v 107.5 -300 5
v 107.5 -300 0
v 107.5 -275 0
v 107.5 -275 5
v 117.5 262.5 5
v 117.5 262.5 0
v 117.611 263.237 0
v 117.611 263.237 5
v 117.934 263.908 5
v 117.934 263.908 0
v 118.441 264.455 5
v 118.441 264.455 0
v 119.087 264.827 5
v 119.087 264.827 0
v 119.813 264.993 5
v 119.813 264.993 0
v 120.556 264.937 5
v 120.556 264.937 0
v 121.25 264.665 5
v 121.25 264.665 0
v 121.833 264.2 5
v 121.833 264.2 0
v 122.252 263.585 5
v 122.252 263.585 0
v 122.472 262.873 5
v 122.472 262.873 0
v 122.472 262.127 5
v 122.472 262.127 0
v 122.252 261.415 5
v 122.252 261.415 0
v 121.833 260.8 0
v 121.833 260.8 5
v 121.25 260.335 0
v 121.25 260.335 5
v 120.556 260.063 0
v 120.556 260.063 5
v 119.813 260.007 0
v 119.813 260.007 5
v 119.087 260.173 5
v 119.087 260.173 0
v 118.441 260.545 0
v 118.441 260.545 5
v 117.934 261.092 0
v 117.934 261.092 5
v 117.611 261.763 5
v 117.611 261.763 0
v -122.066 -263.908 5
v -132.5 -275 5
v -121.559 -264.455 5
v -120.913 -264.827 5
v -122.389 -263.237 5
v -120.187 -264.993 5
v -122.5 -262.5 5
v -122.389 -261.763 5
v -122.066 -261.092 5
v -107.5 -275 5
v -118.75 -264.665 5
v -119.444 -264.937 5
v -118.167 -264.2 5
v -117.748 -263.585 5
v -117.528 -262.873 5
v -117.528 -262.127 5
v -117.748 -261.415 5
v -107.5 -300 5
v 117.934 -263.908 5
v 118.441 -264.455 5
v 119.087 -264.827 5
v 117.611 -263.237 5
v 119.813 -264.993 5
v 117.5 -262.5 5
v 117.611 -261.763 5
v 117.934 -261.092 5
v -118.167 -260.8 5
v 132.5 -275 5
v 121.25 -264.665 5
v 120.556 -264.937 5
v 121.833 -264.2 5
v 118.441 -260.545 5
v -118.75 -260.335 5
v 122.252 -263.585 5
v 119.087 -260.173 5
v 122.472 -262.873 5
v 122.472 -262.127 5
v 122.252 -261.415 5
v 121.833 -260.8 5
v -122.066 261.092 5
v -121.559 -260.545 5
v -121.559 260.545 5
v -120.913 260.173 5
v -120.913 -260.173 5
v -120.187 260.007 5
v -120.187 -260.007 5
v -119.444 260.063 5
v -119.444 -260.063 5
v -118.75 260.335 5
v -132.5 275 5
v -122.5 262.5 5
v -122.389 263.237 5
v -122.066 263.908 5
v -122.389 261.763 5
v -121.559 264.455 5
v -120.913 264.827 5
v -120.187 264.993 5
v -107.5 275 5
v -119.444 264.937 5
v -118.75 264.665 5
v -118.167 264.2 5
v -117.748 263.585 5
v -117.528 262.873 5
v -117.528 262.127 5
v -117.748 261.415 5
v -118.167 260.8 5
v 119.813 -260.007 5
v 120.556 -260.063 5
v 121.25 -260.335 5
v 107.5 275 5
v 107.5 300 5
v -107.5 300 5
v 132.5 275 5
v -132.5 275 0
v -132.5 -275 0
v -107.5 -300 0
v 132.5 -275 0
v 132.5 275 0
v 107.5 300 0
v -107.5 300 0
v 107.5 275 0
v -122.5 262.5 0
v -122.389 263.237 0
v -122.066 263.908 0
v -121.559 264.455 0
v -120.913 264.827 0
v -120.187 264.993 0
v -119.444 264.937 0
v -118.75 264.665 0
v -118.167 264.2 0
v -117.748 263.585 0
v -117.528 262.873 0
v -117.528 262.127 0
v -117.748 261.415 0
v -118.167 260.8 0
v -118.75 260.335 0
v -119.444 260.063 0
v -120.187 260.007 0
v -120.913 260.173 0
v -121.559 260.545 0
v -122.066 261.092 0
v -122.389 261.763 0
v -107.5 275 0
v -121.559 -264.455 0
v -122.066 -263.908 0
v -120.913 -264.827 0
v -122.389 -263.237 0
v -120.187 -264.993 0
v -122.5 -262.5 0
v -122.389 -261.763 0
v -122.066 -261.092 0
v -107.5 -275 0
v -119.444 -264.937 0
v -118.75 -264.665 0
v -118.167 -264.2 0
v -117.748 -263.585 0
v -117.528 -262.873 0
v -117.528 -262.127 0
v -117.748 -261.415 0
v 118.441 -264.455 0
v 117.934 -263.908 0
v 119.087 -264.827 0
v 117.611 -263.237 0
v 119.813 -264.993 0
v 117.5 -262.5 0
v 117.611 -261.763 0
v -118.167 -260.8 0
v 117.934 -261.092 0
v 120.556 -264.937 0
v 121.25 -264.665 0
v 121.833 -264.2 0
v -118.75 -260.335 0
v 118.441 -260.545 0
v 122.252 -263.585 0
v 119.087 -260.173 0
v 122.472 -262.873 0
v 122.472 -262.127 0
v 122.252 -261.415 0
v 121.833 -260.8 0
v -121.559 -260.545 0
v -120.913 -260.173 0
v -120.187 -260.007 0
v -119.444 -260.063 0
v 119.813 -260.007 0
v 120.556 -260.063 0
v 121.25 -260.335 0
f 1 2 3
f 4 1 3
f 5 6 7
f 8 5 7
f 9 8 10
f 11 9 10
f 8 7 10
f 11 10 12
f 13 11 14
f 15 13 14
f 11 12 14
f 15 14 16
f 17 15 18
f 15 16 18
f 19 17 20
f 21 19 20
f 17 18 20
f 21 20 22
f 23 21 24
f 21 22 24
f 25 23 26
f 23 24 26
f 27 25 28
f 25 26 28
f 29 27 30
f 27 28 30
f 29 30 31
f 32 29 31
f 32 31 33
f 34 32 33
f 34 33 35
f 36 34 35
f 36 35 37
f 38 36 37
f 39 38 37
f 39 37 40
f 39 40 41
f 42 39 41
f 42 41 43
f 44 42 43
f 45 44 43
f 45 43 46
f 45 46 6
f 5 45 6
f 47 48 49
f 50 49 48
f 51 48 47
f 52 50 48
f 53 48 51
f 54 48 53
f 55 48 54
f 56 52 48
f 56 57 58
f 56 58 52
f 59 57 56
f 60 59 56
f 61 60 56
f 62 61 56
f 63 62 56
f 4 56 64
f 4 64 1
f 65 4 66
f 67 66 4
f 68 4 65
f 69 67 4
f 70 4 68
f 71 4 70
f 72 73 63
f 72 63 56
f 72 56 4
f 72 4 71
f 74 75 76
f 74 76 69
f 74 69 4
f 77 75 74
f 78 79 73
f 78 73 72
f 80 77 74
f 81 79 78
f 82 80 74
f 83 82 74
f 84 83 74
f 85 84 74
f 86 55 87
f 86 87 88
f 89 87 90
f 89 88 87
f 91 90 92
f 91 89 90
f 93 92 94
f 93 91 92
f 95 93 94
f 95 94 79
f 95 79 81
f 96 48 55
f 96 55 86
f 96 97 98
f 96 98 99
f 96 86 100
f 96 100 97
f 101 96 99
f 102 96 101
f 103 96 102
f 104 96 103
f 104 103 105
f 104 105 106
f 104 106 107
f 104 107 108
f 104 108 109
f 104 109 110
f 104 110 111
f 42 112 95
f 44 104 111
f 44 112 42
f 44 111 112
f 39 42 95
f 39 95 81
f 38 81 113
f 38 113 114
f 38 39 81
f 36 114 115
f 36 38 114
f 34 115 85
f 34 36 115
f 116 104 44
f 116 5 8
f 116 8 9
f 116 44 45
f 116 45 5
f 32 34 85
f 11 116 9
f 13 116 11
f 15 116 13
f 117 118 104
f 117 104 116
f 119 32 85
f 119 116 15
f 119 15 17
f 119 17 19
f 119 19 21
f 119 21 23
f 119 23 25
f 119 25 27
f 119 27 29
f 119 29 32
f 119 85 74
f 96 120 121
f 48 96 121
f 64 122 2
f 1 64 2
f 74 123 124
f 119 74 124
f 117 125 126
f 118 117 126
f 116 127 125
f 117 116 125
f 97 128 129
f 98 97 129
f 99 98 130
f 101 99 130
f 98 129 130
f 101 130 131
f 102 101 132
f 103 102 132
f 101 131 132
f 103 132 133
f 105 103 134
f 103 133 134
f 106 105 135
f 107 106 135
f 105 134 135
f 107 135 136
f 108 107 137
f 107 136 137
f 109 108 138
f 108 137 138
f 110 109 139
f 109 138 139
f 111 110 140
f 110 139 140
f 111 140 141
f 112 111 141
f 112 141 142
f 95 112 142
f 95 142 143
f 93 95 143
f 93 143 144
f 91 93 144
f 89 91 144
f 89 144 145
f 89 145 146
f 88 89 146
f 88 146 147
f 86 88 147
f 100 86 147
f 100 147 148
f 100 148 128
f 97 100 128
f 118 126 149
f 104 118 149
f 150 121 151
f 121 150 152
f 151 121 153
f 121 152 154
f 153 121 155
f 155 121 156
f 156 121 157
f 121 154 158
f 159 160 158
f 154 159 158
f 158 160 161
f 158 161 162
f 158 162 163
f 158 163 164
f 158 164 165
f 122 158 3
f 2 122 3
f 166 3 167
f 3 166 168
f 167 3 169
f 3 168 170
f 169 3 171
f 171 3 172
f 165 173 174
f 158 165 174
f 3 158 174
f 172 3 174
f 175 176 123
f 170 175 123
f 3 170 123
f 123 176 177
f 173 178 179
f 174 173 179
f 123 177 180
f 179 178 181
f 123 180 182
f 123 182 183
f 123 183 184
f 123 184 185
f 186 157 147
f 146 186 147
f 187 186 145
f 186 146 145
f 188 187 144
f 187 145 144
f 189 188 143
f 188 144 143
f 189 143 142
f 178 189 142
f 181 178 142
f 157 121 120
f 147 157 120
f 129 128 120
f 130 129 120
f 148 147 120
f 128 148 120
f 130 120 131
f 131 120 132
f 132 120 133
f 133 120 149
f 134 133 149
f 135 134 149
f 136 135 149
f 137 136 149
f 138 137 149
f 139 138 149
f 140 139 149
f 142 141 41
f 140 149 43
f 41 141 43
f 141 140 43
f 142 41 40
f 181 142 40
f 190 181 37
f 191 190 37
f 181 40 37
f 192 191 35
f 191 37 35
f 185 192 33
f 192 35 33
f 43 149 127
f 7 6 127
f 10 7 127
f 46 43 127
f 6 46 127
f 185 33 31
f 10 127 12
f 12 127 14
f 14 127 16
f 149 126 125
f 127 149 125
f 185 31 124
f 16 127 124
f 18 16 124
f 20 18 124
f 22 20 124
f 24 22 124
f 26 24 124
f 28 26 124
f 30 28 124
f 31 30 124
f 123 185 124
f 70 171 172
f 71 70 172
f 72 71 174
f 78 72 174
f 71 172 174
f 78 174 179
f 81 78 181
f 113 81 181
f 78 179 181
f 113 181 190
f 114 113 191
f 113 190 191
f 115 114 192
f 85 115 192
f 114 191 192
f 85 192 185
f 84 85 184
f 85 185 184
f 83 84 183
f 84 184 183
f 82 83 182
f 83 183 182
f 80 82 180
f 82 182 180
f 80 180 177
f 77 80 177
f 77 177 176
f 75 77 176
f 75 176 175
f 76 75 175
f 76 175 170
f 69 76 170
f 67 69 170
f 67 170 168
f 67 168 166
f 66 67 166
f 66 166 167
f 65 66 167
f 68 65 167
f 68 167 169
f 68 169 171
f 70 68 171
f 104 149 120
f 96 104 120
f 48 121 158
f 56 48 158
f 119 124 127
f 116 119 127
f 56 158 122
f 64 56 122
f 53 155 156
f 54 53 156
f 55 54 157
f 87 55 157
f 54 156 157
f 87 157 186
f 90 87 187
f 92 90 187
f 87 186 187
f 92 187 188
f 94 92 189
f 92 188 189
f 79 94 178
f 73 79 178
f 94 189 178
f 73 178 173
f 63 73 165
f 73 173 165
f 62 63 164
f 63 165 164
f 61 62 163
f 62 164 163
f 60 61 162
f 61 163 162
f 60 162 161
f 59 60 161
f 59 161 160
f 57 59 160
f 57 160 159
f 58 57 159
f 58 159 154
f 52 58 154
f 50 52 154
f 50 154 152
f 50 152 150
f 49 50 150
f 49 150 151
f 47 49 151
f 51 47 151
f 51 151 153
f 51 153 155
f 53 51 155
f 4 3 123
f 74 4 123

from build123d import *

# Parameters (mm, degrees)
F1_DEPTH = 5
F3_D     = 5


with BuildPart() as f1:
    # F0 (on Top) → F1 (new body)
    with BuildSketch(Plane.XY):
        Polygon((107.5, 275), (107.5, 300), (-107.5, 300), (-107.5, 275), (-132.5, 275), (-132.5, -275), (-107.5, -275), (-107.5, -300), (107.5, -300), (107.5, -275), (132.5, -275), (132.5, 275), align=None)
    extrude(amount=F1_DEPTH)

    # F3 (through all)
    with Locations(Plane.XY.offset(5)):
        with Locations((-120, 262.5), (120, 262.5), (-120, -262.5), (120, -262.5)):
            Hole(F3_D / 2)


solid = f1.part
